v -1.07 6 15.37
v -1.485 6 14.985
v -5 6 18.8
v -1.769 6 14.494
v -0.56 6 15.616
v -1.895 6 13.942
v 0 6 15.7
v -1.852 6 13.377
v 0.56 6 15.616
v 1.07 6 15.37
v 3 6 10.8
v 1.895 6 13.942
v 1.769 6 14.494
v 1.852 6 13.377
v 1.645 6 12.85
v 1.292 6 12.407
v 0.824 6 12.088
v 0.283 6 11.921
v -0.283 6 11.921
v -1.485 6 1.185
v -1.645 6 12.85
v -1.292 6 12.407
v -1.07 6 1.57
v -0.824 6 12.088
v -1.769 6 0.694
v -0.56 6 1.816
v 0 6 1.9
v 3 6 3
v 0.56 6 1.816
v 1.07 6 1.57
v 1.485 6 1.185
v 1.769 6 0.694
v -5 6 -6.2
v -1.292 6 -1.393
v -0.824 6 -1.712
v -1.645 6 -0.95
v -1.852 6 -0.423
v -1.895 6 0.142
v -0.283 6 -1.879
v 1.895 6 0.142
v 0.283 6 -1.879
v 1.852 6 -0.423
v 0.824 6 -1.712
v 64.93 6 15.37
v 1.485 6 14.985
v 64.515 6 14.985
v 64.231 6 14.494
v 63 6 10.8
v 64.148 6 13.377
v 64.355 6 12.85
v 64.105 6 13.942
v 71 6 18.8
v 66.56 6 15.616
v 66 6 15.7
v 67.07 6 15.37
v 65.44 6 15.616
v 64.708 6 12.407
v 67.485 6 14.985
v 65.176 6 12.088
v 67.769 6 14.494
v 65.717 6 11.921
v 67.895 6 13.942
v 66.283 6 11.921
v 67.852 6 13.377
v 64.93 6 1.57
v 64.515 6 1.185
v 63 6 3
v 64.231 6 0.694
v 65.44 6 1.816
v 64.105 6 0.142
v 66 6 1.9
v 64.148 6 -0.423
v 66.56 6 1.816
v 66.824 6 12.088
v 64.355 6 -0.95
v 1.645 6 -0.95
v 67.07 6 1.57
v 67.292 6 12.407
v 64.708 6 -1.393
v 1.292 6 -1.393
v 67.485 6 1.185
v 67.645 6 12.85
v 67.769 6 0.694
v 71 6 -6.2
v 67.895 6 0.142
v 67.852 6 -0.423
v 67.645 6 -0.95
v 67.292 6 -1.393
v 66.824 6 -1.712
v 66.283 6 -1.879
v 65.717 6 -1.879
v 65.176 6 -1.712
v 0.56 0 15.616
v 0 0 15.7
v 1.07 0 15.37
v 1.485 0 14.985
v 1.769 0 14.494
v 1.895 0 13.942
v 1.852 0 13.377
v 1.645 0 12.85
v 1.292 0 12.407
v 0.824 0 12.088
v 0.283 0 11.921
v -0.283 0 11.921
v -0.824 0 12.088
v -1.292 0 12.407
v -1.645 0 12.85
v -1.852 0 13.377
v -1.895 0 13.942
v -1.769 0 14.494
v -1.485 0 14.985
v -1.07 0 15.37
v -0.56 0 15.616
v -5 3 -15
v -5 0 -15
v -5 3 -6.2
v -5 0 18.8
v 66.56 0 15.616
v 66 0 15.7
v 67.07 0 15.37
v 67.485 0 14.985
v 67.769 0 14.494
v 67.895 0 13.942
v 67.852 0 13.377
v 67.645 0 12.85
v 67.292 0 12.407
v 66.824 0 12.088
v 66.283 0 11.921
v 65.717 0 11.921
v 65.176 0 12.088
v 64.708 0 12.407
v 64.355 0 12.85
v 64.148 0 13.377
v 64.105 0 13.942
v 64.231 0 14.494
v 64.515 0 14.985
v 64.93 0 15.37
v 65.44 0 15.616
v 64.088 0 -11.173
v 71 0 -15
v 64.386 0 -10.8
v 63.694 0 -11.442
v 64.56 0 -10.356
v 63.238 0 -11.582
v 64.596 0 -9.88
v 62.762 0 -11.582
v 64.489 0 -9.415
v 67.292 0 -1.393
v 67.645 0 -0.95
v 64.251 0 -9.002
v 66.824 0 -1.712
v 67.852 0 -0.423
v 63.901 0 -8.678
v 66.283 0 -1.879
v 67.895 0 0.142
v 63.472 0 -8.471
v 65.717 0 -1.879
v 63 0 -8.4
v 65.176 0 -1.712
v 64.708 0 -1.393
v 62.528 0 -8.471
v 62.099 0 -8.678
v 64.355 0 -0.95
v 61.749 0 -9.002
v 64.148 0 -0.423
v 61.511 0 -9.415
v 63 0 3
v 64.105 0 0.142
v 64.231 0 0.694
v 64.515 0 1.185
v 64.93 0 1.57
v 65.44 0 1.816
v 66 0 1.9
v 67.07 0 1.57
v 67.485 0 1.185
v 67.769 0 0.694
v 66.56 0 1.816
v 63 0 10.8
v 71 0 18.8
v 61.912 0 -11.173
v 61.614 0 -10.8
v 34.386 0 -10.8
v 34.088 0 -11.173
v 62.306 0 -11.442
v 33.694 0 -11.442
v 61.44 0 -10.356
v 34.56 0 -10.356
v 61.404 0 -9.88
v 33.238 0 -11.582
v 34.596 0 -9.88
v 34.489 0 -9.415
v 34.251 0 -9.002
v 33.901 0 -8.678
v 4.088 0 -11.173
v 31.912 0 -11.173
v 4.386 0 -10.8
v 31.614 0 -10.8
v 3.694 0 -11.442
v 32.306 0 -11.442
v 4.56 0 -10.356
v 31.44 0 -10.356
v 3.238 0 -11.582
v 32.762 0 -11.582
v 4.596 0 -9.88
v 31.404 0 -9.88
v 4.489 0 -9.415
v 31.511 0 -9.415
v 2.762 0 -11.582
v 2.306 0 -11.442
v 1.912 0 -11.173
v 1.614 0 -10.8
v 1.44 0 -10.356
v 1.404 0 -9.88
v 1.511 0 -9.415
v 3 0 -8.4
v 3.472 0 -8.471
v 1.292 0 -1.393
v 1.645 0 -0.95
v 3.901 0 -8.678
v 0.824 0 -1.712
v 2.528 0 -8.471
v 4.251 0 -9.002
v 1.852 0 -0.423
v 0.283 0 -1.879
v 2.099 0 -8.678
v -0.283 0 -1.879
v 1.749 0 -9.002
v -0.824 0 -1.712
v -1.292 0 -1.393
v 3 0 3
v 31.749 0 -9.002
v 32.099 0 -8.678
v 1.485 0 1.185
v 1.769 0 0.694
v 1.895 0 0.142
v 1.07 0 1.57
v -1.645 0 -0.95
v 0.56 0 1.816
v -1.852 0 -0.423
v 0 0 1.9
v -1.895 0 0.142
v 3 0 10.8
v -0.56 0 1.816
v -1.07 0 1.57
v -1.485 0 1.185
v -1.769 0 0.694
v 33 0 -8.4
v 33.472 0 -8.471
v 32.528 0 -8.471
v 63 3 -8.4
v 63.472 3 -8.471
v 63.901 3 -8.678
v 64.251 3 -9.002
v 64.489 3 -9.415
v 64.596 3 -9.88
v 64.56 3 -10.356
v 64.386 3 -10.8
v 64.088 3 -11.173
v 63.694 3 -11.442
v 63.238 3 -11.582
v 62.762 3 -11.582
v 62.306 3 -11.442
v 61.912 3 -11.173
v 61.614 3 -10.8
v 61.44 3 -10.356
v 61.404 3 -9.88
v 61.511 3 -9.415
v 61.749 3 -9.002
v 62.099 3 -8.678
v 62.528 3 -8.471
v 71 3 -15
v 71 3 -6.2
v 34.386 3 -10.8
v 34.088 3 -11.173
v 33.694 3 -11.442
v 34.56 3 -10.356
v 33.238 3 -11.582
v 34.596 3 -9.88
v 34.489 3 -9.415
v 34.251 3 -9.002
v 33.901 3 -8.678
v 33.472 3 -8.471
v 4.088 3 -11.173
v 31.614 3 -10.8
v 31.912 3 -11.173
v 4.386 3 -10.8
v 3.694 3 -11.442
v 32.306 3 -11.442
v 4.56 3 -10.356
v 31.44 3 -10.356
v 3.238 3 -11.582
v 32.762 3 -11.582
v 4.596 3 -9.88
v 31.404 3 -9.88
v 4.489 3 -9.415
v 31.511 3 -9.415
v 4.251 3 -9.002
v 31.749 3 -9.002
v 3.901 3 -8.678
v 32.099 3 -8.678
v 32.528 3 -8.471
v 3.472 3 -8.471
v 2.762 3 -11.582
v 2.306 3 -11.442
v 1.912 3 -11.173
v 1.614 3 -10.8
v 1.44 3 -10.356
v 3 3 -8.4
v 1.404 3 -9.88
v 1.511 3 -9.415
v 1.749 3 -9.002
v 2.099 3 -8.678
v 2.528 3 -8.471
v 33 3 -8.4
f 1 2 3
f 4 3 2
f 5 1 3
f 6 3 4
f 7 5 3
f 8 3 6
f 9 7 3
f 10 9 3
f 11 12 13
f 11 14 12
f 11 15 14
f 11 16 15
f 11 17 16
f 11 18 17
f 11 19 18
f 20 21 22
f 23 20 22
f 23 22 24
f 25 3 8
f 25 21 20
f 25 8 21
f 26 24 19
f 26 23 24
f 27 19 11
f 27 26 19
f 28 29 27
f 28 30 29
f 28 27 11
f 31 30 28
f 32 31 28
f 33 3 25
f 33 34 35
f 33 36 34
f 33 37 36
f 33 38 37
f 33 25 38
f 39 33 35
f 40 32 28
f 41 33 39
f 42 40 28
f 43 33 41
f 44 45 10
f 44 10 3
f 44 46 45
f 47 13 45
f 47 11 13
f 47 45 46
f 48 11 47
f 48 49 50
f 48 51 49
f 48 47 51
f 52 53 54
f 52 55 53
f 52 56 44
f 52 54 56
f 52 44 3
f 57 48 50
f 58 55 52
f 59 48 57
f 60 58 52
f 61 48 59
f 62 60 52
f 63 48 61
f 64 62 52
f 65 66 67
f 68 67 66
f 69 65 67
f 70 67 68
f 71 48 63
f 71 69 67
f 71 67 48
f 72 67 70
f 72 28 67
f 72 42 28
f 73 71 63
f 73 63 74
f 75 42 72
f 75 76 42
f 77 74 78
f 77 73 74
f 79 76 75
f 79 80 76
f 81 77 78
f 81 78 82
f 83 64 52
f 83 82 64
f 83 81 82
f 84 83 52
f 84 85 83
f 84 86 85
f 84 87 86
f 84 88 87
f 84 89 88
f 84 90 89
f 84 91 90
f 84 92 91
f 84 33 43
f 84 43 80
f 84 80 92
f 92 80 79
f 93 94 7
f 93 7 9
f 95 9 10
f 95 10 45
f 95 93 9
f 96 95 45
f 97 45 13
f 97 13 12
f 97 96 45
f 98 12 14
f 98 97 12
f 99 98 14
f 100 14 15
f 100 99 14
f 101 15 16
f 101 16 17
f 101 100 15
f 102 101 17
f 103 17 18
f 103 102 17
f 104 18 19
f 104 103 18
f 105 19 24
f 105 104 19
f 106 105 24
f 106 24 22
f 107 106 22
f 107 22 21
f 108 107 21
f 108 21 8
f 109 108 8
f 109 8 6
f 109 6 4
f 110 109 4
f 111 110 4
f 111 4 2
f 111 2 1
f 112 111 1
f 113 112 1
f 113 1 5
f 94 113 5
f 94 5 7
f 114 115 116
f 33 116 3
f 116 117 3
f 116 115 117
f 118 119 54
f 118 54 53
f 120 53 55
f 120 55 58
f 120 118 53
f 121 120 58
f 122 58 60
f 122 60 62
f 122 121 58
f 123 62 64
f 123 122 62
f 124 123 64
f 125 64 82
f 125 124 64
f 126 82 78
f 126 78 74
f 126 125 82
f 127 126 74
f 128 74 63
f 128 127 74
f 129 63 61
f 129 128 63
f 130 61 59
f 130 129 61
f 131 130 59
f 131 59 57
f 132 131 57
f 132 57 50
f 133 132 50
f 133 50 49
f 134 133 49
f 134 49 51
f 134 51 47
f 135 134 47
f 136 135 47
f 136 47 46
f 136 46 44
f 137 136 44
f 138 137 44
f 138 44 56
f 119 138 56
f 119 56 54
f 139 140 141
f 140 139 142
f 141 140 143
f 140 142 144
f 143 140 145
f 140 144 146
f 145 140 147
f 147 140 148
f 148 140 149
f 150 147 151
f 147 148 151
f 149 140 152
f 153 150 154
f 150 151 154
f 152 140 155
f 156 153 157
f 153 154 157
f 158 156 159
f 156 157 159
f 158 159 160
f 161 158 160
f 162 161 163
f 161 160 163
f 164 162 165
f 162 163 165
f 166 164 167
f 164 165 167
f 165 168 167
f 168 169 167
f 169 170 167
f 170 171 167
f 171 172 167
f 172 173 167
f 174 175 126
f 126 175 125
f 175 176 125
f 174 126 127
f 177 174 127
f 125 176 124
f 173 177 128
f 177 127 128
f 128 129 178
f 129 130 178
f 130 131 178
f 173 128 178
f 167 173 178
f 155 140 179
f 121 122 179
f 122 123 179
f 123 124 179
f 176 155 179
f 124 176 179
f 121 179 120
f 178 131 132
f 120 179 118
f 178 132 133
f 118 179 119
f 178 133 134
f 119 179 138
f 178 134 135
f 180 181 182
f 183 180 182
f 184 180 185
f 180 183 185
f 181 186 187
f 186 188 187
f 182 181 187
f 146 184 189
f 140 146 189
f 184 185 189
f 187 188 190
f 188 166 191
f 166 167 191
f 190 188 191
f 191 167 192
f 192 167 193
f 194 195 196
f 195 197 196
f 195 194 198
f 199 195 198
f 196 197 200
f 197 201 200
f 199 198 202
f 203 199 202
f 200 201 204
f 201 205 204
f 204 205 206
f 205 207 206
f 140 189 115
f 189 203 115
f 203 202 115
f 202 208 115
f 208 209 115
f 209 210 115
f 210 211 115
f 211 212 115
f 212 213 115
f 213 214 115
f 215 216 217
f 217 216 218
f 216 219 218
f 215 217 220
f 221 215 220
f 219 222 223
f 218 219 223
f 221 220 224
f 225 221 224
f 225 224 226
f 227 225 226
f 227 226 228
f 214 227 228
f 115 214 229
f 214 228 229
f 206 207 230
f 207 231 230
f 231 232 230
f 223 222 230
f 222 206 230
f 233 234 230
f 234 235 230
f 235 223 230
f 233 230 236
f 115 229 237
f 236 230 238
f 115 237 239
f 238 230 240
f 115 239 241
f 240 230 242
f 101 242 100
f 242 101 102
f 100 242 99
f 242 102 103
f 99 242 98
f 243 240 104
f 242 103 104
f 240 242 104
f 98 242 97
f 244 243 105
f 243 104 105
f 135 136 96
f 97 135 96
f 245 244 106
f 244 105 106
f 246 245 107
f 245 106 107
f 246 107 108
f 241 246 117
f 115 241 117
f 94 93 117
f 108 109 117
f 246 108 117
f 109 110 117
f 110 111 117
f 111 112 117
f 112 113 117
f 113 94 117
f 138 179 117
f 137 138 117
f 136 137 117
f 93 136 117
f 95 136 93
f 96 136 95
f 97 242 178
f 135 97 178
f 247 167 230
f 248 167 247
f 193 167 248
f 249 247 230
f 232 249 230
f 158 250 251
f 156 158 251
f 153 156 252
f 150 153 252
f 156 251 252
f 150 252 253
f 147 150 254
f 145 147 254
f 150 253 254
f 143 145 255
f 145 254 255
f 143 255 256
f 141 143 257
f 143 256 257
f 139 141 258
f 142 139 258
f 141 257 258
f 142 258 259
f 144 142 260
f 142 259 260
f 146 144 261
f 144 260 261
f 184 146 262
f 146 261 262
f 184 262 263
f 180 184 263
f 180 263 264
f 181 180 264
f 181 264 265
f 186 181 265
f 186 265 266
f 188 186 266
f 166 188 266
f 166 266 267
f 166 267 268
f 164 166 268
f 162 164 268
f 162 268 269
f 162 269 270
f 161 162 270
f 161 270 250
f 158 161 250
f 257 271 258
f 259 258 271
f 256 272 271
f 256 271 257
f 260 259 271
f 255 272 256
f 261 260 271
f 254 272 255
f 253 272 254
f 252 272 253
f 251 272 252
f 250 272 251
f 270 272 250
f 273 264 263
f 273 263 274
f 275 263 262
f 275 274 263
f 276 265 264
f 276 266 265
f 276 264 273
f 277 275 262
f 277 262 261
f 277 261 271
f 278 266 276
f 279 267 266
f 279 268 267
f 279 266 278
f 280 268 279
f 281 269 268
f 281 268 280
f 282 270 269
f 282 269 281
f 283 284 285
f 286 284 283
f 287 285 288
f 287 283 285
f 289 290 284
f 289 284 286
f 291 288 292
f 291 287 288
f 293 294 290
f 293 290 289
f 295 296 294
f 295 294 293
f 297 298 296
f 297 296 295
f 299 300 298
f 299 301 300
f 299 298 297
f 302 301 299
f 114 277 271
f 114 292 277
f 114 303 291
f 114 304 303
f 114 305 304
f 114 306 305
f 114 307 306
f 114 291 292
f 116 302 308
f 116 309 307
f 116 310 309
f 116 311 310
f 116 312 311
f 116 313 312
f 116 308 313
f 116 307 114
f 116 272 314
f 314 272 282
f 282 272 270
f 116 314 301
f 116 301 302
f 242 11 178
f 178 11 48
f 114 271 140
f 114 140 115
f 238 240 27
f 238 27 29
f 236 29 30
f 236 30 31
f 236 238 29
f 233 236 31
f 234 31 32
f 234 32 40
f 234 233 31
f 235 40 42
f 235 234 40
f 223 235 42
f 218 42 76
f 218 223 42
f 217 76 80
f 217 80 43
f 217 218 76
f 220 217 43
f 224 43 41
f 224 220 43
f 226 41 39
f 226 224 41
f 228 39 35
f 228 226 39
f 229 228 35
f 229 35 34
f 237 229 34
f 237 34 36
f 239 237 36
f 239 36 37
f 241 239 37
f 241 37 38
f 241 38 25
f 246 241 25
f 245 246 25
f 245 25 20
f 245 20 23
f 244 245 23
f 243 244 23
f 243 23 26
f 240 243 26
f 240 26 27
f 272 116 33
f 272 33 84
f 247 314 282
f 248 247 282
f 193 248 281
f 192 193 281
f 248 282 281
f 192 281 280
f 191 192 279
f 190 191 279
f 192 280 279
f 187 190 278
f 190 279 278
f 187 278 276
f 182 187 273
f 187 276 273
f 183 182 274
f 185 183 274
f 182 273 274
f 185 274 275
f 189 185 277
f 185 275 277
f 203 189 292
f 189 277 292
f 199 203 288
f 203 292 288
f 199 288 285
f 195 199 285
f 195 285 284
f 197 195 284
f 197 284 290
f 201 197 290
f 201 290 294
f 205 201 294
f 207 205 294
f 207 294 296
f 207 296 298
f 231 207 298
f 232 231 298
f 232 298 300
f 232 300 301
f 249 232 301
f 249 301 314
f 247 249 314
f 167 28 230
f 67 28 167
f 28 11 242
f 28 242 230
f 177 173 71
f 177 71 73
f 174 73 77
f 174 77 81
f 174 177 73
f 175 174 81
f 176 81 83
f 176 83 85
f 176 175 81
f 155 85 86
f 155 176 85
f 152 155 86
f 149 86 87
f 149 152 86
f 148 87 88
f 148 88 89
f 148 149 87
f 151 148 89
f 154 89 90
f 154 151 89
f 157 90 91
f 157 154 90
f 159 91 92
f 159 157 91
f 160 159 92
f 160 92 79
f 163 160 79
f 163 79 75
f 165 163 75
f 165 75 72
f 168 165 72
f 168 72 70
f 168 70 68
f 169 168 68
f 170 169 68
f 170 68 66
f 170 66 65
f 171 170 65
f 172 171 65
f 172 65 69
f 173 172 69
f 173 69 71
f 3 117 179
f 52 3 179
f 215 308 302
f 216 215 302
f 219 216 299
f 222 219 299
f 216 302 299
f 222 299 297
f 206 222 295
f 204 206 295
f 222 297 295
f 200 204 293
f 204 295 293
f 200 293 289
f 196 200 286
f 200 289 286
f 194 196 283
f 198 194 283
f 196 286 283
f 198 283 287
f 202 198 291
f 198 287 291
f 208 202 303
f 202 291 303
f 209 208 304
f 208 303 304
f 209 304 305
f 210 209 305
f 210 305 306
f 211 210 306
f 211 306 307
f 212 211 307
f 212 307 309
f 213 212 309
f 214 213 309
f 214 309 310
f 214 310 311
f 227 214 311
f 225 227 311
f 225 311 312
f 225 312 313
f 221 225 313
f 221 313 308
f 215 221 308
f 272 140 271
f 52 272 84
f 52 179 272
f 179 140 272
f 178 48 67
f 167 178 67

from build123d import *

# Parameters (mm, degrees)
SKETCH_1_W          = 76
SKETCH_1_H          = 23.8
SKETCH_1_R          = 1.9
EXTRUDE_1_DEPTH     = 3
SKETCH_3_W          = 76
SKETCH_3_H          = 3
EXTRUDE_2_DEPTH     = 10
SKETCH_4_R          = 1.6
CUT_EXTRUDE_1_DEPTH = 10
SKETCH_5_W          = 60
SKETCH_5_H          = 7.8
CUT_EXTRUDE_2_DEPTH = 10
SKETCH_6_W          = 76
SKETCH_6_H          = 25
SKETCH_6_R          = 1.9
SKETCH_6_W_2        = 60
SKETCH_6_H_2        = 7.8
EXTRUDE_3_DEPTH     = 3


with BuildPart() as part:
    # 草图1 → 凸台-拉伸1 (new body)
    with BuildSketch(Plane(origin=(0, 0, 0), x_dir=(1, 0, 0), z_dir=(0, 1, 0))):
        with Locations((33, -6.9)):
            Rectangle(SKETCH_1_W, SKETCH_1_H)
        Circle(SKETCH_1_R, mode=Mode.SUBTRACT)
        with Locations((0, -13.8)):
            Circle(SKETCH_1_R, mode=Mode.SUBTRACT)
        with Locations((66, -13.8)):
            Circle(SKETCH_1_R, mode=Mode.SUBTRACT)
        with Locations((66, 0)):
            Circle(SKETCH_1_R, mode=Mode.SUBTRACT)
    extrude(amount=EXTRUDE_1_DEPTH)

    # 草图3 → 凸台-拉伸2 (add)
    with BuildSketch(Plane(origin=(0, 0, -5), x_dir=(-1, 0, 0), z_dir=(0, 0, -1))):
        with Locations((-33, 1.5)):
            Rectangle(SKETCH_3_W, SKETCH_3_H)
    extrude(amount=EXTRUDE_2_DEPTH)

    # 草图4 → 切除-拉伸1 (cut)
    with BuildSketch(Plane(origin=(0, 3, 0), x_dir=(1, 0, 0), z_dir=(0, 1, 0))):
        with Locations((3, 10)):
            Circle(SKETCH_4_R)
        with Locations((33, 10)):
            Circle(SKETCH_4_R)
        with Locations((63, 10)):
            Circle(SKETCH_4_R)
    extrude(amount=-CUT_EXTRUDE_1_DEPTH, mode=Mode.SUBTRACT)

    # 草图5 → 切除-拉伸2 (cut)
    with BuildSketch(Plane(origin=(0, 3, 0), x_dir=(1, 0, 0), z_dir=(0, 1, 0))):
        with Locations((33, -6.9)):
            Rectangle(SKETCH_5_W, SKETCH_5_H)
    extrude(amount=-CUT_EXTRUDE_2_DEPTH, mode=Mode.SUBTRACT)

    # 草图6 → 凸台-拉伸3 (add)
    with BuildSketch(Plane(origin=(0, 3, 0), x_dir=(1, 0, 0), z_dir=(0, 1, 0))):
        with Locations((33, -6.3)):
            Rectangle(SKETCH_6_W, SKETCH_6_H)
        with Locations((0, -13.8)):
            Circle(SKETCH_6_R, mode=Mode.SUBTRACT)
        with Locations((33, -6.9)):
            Rectangle(SKETCH_6_W_2, SKETCH_6_H_2, mode=Mode.SUBTRACT)
        with Locations((66, -13.8)):
            Circle(SKETCH_6_R, mode=Mode.SUBTRACT)
        Circle(SKETCH_6_R, mode=Mode.SUBTRACT)
        with Locations((66, 0)):
            Circle(SKETCH_6_R, mode=Mode.SUBTRACT)
    extrude(amount=EXTRUDE_3_DEPTH)


solid = part.part
